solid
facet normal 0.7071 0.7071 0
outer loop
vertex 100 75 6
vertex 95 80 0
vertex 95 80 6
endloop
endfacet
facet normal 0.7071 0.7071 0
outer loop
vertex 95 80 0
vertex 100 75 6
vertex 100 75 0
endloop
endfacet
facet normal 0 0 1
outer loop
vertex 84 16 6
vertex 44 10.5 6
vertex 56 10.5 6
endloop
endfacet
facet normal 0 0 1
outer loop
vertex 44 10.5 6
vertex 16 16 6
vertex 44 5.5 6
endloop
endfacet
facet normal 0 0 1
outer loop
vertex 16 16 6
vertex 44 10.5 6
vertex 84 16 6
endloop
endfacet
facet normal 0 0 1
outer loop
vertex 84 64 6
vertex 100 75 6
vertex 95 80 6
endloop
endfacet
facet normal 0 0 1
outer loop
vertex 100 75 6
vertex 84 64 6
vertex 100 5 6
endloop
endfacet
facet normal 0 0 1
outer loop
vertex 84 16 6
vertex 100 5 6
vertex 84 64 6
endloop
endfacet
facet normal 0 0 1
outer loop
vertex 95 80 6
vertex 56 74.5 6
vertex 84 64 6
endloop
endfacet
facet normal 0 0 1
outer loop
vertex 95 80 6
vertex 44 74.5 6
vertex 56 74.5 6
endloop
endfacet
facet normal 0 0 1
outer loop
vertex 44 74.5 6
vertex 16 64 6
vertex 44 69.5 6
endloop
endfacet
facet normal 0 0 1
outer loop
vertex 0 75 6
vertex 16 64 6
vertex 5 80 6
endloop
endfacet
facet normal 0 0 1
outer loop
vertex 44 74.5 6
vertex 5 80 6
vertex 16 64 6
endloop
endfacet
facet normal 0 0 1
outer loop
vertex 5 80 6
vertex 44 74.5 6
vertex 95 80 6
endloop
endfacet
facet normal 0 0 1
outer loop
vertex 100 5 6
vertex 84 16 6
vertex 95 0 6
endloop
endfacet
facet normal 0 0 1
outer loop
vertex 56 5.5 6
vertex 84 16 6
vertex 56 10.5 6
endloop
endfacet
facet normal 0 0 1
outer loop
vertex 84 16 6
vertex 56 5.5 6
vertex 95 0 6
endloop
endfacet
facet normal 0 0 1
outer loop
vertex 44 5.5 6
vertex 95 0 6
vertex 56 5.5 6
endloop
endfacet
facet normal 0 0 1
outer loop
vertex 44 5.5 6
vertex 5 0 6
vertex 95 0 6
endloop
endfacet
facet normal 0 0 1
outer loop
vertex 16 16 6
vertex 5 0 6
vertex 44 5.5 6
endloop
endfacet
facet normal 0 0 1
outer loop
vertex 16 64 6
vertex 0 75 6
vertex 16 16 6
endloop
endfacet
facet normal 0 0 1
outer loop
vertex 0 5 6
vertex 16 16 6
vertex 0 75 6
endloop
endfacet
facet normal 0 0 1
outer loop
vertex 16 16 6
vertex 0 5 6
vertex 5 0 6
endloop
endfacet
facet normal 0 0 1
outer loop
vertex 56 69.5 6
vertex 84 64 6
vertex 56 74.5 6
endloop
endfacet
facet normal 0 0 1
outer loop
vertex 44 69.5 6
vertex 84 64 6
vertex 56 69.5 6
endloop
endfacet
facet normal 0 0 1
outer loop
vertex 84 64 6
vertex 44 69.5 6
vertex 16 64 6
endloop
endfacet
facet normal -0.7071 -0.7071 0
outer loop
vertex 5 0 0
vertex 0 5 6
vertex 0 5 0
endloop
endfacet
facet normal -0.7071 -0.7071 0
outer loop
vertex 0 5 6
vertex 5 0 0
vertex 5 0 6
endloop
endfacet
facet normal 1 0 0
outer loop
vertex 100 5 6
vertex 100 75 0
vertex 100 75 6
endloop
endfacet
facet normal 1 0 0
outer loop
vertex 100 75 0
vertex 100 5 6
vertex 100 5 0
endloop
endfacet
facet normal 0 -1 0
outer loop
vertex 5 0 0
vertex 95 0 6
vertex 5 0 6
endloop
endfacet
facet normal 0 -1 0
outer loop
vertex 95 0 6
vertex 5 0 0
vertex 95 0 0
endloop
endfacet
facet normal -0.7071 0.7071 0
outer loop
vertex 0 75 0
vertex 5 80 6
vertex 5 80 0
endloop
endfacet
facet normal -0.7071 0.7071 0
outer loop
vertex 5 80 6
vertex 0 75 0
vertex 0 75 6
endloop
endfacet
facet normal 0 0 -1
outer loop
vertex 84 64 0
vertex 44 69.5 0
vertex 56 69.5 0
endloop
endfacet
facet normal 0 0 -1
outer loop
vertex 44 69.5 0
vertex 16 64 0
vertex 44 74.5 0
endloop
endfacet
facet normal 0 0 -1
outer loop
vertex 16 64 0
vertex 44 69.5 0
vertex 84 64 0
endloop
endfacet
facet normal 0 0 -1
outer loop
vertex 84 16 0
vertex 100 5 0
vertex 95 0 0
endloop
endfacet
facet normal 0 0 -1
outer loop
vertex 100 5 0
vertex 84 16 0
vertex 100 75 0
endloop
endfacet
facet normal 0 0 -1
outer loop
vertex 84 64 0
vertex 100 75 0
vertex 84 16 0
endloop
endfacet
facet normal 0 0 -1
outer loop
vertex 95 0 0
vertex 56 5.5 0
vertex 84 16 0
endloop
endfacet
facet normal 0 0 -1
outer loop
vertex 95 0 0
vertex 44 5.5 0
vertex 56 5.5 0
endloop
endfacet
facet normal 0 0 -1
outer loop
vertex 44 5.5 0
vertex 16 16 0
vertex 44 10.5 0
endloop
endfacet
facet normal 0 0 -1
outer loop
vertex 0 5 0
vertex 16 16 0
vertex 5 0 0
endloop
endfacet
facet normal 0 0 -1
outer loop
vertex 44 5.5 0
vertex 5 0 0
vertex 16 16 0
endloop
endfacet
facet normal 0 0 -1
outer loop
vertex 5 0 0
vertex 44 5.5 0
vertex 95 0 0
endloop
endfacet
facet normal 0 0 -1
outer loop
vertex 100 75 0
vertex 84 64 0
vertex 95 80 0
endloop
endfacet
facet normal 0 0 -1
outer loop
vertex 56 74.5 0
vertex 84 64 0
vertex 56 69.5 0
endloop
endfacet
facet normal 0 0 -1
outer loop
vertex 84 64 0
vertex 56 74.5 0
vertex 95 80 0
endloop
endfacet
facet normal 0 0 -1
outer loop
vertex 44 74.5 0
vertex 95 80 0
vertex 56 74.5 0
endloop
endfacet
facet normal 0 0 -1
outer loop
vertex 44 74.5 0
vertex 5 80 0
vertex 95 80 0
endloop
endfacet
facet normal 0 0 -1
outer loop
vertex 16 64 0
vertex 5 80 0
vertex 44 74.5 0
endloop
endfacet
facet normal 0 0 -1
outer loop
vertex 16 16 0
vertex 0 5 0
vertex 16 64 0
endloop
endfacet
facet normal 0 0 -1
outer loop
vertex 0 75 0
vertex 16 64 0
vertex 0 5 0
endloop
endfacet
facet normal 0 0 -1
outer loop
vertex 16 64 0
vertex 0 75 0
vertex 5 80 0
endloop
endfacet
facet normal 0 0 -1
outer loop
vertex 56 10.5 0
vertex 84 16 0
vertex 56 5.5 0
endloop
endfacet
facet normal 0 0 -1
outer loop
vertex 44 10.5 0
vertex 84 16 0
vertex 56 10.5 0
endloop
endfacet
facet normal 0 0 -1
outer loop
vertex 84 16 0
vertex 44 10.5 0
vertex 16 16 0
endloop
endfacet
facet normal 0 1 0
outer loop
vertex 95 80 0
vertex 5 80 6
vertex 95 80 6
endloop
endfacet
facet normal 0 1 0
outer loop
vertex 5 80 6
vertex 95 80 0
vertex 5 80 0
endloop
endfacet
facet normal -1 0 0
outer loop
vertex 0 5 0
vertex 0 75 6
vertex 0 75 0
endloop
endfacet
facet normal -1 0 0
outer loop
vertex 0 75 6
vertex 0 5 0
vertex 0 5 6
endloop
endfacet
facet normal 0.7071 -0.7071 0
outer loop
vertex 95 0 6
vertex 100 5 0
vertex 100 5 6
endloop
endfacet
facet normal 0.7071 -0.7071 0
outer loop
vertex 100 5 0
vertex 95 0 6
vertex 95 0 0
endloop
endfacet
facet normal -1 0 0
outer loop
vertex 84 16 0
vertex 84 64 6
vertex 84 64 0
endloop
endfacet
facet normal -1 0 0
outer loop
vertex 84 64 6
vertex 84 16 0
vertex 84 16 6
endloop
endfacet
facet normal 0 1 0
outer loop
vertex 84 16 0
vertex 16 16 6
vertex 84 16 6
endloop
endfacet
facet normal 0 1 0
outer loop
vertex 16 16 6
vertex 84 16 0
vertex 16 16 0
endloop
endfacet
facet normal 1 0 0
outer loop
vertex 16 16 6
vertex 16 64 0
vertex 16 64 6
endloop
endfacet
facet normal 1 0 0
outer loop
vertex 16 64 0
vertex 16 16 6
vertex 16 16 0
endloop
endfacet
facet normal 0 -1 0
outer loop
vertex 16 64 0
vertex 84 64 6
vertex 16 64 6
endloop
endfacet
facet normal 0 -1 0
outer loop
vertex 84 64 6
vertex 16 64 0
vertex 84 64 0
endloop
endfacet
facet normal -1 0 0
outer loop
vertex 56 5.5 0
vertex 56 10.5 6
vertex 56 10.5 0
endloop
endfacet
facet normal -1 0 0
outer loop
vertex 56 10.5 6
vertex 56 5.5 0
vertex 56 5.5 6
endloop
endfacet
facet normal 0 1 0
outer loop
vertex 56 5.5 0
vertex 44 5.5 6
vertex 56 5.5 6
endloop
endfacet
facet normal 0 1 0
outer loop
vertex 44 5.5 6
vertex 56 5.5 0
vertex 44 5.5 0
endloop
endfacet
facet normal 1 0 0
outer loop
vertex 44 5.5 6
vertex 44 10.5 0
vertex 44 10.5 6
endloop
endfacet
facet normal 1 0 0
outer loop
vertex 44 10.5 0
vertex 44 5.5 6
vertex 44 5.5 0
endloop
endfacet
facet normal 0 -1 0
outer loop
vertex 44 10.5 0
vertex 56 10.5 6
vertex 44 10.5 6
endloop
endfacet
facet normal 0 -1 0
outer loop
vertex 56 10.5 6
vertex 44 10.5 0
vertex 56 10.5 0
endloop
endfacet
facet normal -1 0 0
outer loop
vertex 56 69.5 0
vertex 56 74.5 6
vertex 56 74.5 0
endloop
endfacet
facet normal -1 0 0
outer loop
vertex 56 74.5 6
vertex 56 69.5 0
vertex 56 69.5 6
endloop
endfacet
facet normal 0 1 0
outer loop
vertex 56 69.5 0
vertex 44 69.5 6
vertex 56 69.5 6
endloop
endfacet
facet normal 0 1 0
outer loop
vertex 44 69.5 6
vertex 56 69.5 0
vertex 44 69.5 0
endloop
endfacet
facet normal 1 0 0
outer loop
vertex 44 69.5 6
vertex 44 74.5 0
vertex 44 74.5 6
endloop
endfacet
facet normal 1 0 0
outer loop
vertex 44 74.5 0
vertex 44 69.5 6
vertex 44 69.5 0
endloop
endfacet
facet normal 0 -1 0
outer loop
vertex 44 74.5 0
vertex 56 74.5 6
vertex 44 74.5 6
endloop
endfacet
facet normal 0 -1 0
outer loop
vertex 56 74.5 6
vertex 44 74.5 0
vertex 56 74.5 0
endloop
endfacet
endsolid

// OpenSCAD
$fn = 32;

// ----------------------------------------------------------------------
// Frame plate: 100 x 80 frame, 16 mm rails
// ----------------------------------------------------------------------

// --- parameters (mm) ---
plate_l = 100;            // plate length, X
plate_w = 80;             // plate width, Y
plate_t = 6;              // plate thickness, Z (extrusion height)
corner_c = 5;             // corner chamfer
frame_bar = 16;           // frame rail width
slot_l = 12;              // adjustment slot length
slot_w = 5;               // adjustment slot width

win_l = plate_l - 2 * frame_bar;  // window length
win_w = plate_w - 2 * frame_bar;  // window width

profile = [[5, 0], [95, 0], [100, 5], [100, 75], [95, 80], [5, 80], [0, 75], [0, 5]];  // primary outline, 8 points, counter clockwise
void_1 = [[16, 16], [84, 16], [84, 64], [16, 64]];  // the window, 4 points
void_2 = [[44, 5.5], [56, 5.5], [56, 10.5], [44, 10.5]];  // adjustment slot, 4 points
void_3 = [[44, 69.5], [56, 69.5], [56, 74.5], [44, 74.5]];  // adjustment slot, 4 points

// --- the one profile operation ---
difference() {
  linear_extrude(height = plate_t) polygon(points = profile);
  translate([0, 0, -1])
    linear_extrude(height = plate_t + 2) polygon(points = void_1);
  translate([0, 0, -1])
    linear_extrude(height = plate_t + 2) polygon(points = void_2);
  translate([0, 0, -1])
    linear_extrude(height = plate_t + 2) polygon(points = void_3);
}
